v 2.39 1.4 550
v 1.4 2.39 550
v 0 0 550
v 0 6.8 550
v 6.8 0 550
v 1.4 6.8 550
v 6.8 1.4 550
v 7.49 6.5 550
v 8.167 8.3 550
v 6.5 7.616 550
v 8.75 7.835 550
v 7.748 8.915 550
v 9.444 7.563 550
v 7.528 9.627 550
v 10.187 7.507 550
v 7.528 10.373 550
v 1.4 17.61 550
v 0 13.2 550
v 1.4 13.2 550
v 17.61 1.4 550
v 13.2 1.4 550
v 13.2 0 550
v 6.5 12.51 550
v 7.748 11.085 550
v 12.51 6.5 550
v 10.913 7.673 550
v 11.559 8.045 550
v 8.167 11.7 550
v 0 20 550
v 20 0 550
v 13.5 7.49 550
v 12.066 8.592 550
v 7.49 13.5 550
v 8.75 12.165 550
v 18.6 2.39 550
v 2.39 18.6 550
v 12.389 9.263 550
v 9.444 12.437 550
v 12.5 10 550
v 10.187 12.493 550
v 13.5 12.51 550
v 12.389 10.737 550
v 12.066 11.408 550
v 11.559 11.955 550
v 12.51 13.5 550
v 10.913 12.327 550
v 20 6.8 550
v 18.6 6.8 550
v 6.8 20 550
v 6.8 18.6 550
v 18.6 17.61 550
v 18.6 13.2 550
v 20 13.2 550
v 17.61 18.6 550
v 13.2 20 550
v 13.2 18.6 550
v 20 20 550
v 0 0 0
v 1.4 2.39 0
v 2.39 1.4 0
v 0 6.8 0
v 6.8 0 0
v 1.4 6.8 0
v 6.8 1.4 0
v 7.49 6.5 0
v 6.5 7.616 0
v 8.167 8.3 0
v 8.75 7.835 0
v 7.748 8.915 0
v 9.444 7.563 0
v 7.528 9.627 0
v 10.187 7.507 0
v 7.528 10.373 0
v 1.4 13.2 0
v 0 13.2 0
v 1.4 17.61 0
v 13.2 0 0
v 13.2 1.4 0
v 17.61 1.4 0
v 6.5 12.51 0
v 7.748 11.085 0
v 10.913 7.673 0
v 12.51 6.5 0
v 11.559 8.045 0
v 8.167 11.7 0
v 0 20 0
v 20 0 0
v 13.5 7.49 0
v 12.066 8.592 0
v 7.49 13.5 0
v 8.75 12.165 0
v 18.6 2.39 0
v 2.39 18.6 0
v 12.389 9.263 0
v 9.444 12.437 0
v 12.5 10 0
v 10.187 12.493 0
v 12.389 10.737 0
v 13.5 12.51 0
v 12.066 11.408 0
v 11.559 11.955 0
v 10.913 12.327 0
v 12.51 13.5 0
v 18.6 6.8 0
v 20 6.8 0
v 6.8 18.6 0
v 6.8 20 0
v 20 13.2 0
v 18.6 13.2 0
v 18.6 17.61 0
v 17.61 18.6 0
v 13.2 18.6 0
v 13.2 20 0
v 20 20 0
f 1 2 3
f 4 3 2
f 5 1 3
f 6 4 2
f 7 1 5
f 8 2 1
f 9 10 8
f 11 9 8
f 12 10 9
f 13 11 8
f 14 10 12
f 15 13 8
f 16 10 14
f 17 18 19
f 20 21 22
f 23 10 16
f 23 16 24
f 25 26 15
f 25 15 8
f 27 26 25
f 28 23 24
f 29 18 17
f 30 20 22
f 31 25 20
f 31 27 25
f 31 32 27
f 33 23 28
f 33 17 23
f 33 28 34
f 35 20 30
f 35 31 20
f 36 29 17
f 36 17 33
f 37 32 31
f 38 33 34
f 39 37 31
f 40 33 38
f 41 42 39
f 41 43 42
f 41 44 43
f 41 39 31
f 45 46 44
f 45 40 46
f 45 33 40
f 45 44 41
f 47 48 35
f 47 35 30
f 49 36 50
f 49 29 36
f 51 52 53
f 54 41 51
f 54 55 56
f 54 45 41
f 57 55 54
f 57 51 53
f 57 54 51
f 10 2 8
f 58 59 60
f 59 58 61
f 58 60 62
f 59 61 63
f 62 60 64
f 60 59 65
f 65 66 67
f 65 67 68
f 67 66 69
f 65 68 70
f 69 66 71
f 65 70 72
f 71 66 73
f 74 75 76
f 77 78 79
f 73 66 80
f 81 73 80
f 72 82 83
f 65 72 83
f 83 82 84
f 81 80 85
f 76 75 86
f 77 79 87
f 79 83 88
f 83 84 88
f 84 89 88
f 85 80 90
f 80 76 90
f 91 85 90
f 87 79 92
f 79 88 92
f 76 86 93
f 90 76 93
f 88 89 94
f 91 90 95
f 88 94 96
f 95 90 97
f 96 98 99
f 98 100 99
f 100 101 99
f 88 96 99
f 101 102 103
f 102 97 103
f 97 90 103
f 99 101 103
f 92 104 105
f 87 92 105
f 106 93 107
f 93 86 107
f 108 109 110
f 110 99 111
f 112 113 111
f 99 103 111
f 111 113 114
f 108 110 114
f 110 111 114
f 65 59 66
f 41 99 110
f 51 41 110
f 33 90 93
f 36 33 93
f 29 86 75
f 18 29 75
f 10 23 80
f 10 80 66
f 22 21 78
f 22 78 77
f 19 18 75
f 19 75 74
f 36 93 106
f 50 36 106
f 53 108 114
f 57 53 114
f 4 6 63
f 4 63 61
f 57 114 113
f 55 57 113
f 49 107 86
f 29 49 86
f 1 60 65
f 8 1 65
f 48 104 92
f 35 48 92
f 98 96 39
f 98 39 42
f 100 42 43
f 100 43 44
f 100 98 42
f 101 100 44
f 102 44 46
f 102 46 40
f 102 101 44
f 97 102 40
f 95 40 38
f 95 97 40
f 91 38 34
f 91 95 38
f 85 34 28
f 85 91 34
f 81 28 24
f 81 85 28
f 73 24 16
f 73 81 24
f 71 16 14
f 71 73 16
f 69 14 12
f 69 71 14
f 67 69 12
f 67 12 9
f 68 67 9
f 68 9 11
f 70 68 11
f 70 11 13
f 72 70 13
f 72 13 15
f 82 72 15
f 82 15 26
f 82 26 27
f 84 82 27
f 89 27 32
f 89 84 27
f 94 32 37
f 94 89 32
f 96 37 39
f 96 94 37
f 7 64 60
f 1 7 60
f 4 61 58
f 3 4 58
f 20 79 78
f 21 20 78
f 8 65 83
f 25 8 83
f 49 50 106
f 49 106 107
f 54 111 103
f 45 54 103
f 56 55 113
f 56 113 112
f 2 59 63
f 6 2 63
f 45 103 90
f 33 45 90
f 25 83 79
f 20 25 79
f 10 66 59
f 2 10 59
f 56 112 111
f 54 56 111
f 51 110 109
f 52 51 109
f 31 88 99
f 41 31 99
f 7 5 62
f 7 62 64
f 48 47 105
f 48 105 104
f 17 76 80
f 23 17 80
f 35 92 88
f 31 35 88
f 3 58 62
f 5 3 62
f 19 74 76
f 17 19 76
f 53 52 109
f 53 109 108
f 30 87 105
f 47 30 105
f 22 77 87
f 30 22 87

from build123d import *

# Parameters (mm, degrees)
F0_R     = 2.5
F1_DEPTH = 550


with BuildPart() as f1:
    # F0 (on Top) → F1 (new body)
    with BuildSketch(Plane.XY):
        Polygon((6.5, 7.616114), (1.4, 2.389949), (1.4, 6.8), (0, 6.8), (0, 0), (6.8, 0), (6.8, 1.4), (2.389949, 1.4), (7.489949, 6.5), (12.510051, 6.5), (17.610051, 1.4), (13.2, 1.4), (13.2, 0), (20, 0), (20, 6.8), (18.6, 6.8), (18.6, 2.389949), (13.5, 7.489949), (13.5, 12.510051), (18.6, 17.610051), (18.6, 13.2), (20, 13.2), (20, 20), (13.2, 20), (13.2, 18.6), (17.610051, 18.6), (12.510051, 13.5), (7.489949, 13.5), (2.389949, 18.6), (6.8, 18.6), (6.8, 20), (0, 20), (0, 13.2), (1.4, 13.2), (1.4, 17.610051), (6.5, 12.510051), align=None)
        with Locations((10, 10)):
            Circle(F0_R, mode=Mode.SUBTRACT)
    extrude(amount=F1_DEPTH)


solid = f1.part
